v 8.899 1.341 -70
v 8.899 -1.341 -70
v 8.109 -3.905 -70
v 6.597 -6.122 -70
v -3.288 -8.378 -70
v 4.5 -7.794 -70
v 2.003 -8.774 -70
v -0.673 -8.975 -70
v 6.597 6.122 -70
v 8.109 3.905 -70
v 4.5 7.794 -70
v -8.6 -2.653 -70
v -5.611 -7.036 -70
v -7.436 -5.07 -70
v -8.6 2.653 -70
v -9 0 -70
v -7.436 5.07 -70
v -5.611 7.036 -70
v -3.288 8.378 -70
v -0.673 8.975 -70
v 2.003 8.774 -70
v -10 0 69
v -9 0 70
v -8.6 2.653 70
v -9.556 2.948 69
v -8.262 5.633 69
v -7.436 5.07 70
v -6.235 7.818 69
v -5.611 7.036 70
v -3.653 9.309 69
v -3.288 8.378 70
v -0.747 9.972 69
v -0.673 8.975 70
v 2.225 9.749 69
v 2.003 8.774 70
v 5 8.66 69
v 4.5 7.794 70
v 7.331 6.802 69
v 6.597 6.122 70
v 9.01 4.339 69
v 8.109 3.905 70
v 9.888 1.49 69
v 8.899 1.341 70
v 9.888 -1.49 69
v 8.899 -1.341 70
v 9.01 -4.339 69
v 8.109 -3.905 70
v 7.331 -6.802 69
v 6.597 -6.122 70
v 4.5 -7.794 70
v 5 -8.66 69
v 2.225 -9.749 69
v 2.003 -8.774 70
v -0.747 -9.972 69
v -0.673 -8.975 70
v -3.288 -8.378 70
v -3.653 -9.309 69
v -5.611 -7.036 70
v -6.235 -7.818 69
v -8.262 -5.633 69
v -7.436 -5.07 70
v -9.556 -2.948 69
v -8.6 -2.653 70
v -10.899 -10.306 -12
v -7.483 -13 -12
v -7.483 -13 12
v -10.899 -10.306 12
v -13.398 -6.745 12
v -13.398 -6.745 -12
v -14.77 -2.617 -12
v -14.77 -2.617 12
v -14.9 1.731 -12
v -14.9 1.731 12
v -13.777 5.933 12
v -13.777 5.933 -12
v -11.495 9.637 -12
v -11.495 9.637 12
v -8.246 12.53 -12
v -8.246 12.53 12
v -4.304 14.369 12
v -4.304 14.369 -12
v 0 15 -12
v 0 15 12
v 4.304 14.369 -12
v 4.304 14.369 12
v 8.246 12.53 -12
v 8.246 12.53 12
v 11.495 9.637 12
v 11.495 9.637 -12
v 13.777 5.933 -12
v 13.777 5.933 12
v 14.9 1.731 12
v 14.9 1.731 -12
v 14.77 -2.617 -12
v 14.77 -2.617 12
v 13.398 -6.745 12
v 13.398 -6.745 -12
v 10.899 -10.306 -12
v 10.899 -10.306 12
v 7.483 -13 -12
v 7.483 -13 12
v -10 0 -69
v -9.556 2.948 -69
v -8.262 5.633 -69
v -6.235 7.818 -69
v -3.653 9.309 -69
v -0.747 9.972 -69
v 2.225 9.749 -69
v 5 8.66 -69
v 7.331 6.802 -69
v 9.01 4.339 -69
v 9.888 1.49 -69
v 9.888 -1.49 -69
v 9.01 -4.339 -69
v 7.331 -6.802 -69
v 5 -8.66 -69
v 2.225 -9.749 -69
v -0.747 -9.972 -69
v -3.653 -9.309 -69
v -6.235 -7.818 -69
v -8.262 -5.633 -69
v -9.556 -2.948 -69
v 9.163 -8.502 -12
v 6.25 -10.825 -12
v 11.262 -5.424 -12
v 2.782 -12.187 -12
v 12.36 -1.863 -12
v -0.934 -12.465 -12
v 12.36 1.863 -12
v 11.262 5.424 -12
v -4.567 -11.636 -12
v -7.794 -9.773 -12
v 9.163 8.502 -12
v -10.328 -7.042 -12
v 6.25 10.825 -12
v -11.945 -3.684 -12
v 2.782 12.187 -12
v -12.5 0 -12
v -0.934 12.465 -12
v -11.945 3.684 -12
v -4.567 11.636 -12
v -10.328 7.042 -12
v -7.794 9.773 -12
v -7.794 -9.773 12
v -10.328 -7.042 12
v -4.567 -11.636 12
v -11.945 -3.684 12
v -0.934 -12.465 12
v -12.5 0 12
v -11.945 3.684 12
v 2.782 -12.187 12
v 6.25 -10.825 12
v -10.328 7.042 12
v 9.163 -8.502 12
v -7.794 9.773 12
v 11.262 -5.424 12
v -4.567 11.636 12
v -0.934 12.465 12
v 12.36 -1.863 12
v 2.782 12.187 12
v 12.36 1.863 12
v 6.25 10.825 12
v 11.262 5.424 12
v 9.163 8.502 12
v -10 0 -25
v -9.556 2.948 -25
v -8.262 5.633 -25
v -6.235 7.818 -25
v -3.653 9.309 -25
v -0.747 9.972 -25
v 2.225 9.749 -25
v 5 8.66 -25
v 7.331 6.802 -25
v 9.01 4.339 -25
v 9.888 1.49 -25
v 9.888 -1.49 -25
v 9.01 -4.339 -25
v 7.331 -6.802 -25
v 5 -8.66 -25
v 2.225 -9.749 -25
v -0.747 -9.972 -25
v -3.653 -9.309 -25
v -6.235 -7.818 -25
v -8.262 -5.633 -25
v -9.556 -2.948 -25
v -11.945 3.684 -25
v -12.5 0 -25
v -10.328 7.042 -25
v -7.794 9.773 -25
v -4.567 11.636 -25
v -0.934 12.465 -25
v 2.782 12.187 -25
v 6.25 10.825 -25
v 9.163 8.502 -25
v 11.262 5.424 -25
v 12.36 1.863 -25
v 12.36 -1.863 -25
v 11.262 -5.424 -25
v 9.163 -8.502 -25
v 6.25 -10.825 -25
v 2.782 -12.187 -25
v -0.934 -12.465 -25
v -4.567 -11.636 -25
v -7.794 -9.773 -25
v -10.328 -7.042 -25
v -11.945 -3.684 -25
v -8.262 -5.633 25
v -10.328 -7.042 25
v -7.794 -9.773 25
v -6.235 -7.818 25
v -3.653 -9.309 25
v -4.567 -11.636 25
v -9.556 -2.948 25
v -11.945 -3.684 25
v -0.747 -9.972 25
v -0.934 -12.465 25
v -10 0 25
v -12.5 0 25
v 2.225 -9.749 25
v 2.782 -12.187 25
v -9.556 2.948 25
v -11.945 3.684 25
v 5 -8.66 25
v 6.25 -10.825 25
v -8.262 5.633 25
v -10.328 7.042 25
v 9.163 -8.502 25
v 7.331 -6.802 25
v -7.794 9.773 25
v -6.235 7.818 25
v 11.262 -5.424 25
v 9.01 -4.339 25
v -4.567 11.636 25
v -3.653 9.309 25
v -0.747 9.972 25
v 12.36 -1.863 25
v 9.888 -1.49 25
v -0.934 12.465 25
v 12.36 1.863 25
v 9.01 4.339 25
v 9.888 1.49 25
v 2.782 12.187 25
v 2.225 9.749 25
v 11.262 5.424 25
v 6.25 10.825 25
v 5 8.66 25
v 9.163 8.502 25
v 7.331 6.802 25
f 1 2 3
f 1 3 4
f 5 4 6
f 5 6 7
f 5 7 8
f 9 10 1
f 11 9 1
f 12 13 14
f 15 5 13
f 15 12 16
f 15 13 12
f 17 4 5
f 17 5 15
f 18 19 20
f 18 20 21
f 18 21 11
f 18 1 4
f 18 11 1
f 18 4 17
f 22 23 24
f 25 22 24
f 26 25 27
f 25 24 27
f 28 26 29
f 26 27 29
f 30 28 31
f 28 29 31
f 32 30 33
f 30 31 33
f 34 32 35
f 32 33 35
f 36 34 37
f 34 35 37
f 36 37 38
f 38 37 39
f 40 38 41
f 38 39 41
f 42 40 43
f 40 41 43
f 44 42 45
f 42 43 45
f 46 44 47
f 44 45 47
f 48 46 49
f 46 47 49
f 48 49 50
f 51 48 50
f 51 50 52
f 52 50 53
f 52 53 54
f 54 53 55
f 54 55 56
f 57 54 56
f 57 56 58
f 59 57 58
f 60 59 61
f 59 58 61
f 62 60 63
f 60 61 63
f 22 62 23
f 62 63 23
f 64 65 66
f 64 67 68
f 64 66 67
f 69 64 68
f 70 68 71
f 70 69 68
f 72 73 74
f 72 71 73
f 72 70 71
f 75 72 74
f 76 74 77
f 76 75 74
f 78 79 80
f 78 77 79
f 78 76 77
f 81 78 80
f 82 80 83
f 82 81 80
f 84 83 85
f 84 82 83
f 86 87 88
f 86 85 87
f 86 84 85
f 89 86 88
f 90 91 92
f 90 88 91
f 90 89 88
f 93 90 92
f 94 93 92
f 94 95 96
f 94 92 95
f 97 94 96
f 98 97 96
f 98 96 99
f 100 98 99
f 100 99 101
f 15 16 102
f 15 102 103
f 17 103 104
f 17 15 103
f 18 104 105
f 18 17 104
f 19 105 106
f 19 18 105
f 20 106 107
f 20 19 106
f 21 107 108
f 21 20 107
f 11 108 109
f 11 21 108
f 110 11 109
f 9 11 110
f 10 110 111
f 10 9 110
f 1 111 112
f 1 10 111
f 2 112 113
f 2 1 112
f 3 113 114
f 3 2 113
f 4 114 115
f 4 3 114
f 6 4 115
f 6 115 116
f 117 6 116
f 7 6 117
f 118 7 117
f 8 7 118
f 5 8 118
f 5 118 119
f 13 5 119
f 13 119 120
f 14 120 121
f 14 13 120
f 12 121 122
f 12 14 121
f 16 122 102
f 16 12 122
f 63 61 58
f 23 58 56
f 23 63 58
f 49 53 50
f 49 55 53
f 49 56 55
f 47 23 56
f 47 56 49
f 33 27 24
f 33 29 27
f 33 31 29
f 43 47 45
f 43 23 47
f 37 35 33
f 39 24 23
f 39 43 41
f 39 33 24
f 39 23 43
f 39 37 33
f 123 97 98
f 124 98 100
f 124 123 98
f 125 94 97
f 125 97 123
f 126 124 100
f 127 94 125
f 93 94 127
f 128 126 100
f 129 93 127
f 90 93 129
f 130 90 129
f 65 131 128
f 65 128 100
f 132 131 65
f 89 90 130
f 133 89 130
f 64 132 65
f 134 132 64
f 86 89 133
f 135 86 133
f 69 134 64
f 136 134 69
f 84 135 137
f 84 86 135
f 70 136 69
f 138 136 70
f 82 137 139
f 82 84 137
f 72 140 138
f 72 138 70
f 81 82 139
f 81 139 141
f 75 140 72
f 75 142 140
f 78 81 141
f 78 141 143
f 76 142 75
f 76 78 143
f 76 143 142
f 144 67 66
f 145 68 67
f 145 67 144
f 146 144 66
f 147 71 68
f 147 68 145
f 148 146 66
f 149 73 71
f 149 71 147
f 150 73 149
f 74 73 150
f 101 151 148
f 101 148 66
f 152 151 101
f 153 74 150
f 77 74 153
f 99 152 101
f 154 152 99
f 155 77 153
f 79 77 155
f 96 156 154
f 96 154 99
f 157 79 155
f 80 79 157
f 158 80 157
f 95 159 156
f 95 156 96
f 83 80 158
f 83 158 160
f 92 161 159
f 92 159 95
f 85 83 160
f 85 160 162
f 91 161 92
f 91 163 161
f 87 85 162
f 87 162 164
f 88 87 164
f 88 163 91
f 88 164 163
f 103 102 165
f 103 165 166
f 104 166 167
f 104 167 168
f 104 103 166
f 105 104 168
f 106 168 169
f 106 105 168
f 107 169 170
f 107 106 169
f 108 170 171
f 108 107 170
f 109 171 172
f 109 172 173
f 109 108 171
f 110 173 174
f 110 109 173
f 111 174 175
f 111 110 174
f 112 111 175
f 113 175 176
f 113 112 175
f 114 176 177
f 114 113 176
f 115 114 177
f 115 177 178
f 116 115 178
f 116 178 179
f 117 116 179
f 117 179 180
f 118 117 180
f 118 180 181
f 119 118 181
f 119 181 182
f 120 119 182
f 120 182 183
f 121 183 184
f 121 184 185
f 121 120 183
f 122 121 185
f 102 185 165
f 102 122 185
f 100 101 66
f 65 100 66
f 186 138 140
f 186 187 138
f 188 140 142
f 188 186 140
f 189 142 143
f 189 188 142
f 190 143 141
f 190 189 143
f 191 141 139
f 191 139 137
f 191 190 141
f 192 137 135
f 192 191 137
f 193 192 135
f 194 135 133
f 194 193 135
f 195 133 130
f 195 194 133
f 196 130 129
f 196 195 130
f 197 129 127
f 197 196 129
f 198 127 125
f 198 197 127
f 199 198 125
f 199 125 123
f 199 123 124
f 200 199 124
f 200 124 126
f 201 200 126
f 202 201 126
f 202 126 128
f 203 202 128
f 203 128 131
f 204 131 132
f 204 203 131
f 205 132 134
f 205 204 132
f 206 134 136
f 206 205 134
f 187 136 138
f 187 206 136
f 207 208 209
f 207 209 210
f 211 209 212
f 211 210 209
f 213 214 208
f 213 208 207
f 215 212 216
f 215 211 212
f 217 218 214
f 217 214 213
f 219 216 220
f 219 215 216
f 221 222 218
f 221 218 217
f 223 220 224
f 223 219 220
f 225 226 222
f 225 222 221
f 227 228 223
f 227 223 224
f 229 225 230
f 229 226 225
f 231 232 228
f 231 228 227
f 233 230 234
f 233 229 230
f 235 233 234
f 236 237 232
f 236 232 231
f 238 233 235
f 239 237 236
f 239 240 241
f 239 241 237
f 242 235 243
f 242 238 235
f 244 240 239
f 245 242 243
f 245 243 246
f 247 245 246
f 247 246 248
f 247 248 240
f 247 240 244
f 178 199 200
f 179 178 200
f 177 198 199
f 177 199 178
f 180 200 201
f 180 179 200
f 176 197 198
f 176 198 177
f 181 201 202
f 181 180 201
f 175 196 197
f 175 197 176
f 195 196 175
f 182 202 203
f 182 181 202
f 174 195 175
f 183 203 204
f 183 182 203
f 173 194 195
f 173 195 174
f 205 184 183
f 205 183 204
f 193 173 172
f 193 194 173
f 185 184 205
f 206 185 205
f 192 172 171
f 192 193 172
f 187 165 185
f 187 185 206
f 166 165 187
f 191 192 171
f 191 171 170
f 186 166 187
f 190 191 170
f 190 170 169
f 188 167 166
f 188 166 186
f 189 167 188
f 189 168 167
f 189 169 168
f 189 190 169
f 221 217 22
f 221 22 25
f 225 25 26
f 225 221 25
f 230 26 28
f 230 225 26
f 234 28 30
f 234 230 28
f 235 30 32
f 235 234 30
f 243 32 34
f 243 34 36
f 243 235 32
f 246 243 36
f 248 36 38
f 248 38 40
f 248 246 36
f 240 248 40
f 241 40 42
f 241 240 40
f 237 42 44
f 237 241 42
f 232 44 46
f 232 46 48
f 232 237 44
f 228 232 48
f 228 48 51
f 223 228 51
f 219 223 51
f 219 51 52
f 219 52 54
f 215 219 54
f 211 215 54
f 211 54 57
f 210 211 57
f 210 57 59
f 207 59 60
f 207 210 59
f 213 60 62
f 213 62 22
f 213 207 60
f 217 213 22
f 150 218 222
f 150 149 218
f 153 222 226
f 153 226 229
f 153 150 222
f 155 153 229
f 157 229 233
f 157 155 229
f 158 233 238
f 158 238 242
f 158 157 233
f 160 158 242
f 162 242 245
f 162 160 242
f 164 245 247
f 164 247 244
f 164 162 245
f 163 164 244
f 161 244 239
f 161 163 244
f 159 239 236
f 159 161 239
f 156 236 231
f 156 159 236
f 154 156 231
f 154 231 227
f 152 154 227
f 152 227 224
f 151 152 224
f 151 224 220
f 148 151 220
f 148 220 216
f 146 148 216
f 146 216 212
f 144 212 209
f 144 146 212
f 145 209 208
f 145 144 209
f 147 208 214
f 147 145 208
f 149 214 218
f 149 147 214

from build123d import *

# Parameters (mm, degrees)
F3_DEPTH      = 25
F3_DEPTH_BACK = 25
F4_SIZE       = 1


with BuildPart() as f1:
    # F0 (on Front) → F1 (revolve)
    with BuildSketch(Plane.XZ):
        Polygon((-12.5, 12), (-15, 12), (-15, 0), (-15, -12), (-12.5, -12), (-12.5, -25), (-10, -25), (-10, -70), (0, -70), (0, 0), (0, 70), (-10, 70), (-10, 25), (-12.5, 25), align=None)
    revolve(axis=Axis((0, 0, 35), (0, 0, -1)))

    # F2 (on Top) → F3 (cut, two sides)
    with BuildSketch(Plane.XY) as f3_sk:
        Polygon((0, -13), (-15, -13), (-15, -17), (0, -17), (15, -17), (15, -13), align=None)
    extrude(amount=F3_DEPTH, mode=Mode.SUBTRACT)
    extrude(f3_sk.sketch, amount=-F3_DEPTH_BACK, mode=Mode.SUBTRACT)

    # F4
    f4_edges = [f1.edges().sort_by_distance(p)[0] for p in [
        (10, 0, 70),
        (10, 0, -70),
    ]]
    chamfer(f4_edges, length=F4_SIZE)


solid = f1.part
